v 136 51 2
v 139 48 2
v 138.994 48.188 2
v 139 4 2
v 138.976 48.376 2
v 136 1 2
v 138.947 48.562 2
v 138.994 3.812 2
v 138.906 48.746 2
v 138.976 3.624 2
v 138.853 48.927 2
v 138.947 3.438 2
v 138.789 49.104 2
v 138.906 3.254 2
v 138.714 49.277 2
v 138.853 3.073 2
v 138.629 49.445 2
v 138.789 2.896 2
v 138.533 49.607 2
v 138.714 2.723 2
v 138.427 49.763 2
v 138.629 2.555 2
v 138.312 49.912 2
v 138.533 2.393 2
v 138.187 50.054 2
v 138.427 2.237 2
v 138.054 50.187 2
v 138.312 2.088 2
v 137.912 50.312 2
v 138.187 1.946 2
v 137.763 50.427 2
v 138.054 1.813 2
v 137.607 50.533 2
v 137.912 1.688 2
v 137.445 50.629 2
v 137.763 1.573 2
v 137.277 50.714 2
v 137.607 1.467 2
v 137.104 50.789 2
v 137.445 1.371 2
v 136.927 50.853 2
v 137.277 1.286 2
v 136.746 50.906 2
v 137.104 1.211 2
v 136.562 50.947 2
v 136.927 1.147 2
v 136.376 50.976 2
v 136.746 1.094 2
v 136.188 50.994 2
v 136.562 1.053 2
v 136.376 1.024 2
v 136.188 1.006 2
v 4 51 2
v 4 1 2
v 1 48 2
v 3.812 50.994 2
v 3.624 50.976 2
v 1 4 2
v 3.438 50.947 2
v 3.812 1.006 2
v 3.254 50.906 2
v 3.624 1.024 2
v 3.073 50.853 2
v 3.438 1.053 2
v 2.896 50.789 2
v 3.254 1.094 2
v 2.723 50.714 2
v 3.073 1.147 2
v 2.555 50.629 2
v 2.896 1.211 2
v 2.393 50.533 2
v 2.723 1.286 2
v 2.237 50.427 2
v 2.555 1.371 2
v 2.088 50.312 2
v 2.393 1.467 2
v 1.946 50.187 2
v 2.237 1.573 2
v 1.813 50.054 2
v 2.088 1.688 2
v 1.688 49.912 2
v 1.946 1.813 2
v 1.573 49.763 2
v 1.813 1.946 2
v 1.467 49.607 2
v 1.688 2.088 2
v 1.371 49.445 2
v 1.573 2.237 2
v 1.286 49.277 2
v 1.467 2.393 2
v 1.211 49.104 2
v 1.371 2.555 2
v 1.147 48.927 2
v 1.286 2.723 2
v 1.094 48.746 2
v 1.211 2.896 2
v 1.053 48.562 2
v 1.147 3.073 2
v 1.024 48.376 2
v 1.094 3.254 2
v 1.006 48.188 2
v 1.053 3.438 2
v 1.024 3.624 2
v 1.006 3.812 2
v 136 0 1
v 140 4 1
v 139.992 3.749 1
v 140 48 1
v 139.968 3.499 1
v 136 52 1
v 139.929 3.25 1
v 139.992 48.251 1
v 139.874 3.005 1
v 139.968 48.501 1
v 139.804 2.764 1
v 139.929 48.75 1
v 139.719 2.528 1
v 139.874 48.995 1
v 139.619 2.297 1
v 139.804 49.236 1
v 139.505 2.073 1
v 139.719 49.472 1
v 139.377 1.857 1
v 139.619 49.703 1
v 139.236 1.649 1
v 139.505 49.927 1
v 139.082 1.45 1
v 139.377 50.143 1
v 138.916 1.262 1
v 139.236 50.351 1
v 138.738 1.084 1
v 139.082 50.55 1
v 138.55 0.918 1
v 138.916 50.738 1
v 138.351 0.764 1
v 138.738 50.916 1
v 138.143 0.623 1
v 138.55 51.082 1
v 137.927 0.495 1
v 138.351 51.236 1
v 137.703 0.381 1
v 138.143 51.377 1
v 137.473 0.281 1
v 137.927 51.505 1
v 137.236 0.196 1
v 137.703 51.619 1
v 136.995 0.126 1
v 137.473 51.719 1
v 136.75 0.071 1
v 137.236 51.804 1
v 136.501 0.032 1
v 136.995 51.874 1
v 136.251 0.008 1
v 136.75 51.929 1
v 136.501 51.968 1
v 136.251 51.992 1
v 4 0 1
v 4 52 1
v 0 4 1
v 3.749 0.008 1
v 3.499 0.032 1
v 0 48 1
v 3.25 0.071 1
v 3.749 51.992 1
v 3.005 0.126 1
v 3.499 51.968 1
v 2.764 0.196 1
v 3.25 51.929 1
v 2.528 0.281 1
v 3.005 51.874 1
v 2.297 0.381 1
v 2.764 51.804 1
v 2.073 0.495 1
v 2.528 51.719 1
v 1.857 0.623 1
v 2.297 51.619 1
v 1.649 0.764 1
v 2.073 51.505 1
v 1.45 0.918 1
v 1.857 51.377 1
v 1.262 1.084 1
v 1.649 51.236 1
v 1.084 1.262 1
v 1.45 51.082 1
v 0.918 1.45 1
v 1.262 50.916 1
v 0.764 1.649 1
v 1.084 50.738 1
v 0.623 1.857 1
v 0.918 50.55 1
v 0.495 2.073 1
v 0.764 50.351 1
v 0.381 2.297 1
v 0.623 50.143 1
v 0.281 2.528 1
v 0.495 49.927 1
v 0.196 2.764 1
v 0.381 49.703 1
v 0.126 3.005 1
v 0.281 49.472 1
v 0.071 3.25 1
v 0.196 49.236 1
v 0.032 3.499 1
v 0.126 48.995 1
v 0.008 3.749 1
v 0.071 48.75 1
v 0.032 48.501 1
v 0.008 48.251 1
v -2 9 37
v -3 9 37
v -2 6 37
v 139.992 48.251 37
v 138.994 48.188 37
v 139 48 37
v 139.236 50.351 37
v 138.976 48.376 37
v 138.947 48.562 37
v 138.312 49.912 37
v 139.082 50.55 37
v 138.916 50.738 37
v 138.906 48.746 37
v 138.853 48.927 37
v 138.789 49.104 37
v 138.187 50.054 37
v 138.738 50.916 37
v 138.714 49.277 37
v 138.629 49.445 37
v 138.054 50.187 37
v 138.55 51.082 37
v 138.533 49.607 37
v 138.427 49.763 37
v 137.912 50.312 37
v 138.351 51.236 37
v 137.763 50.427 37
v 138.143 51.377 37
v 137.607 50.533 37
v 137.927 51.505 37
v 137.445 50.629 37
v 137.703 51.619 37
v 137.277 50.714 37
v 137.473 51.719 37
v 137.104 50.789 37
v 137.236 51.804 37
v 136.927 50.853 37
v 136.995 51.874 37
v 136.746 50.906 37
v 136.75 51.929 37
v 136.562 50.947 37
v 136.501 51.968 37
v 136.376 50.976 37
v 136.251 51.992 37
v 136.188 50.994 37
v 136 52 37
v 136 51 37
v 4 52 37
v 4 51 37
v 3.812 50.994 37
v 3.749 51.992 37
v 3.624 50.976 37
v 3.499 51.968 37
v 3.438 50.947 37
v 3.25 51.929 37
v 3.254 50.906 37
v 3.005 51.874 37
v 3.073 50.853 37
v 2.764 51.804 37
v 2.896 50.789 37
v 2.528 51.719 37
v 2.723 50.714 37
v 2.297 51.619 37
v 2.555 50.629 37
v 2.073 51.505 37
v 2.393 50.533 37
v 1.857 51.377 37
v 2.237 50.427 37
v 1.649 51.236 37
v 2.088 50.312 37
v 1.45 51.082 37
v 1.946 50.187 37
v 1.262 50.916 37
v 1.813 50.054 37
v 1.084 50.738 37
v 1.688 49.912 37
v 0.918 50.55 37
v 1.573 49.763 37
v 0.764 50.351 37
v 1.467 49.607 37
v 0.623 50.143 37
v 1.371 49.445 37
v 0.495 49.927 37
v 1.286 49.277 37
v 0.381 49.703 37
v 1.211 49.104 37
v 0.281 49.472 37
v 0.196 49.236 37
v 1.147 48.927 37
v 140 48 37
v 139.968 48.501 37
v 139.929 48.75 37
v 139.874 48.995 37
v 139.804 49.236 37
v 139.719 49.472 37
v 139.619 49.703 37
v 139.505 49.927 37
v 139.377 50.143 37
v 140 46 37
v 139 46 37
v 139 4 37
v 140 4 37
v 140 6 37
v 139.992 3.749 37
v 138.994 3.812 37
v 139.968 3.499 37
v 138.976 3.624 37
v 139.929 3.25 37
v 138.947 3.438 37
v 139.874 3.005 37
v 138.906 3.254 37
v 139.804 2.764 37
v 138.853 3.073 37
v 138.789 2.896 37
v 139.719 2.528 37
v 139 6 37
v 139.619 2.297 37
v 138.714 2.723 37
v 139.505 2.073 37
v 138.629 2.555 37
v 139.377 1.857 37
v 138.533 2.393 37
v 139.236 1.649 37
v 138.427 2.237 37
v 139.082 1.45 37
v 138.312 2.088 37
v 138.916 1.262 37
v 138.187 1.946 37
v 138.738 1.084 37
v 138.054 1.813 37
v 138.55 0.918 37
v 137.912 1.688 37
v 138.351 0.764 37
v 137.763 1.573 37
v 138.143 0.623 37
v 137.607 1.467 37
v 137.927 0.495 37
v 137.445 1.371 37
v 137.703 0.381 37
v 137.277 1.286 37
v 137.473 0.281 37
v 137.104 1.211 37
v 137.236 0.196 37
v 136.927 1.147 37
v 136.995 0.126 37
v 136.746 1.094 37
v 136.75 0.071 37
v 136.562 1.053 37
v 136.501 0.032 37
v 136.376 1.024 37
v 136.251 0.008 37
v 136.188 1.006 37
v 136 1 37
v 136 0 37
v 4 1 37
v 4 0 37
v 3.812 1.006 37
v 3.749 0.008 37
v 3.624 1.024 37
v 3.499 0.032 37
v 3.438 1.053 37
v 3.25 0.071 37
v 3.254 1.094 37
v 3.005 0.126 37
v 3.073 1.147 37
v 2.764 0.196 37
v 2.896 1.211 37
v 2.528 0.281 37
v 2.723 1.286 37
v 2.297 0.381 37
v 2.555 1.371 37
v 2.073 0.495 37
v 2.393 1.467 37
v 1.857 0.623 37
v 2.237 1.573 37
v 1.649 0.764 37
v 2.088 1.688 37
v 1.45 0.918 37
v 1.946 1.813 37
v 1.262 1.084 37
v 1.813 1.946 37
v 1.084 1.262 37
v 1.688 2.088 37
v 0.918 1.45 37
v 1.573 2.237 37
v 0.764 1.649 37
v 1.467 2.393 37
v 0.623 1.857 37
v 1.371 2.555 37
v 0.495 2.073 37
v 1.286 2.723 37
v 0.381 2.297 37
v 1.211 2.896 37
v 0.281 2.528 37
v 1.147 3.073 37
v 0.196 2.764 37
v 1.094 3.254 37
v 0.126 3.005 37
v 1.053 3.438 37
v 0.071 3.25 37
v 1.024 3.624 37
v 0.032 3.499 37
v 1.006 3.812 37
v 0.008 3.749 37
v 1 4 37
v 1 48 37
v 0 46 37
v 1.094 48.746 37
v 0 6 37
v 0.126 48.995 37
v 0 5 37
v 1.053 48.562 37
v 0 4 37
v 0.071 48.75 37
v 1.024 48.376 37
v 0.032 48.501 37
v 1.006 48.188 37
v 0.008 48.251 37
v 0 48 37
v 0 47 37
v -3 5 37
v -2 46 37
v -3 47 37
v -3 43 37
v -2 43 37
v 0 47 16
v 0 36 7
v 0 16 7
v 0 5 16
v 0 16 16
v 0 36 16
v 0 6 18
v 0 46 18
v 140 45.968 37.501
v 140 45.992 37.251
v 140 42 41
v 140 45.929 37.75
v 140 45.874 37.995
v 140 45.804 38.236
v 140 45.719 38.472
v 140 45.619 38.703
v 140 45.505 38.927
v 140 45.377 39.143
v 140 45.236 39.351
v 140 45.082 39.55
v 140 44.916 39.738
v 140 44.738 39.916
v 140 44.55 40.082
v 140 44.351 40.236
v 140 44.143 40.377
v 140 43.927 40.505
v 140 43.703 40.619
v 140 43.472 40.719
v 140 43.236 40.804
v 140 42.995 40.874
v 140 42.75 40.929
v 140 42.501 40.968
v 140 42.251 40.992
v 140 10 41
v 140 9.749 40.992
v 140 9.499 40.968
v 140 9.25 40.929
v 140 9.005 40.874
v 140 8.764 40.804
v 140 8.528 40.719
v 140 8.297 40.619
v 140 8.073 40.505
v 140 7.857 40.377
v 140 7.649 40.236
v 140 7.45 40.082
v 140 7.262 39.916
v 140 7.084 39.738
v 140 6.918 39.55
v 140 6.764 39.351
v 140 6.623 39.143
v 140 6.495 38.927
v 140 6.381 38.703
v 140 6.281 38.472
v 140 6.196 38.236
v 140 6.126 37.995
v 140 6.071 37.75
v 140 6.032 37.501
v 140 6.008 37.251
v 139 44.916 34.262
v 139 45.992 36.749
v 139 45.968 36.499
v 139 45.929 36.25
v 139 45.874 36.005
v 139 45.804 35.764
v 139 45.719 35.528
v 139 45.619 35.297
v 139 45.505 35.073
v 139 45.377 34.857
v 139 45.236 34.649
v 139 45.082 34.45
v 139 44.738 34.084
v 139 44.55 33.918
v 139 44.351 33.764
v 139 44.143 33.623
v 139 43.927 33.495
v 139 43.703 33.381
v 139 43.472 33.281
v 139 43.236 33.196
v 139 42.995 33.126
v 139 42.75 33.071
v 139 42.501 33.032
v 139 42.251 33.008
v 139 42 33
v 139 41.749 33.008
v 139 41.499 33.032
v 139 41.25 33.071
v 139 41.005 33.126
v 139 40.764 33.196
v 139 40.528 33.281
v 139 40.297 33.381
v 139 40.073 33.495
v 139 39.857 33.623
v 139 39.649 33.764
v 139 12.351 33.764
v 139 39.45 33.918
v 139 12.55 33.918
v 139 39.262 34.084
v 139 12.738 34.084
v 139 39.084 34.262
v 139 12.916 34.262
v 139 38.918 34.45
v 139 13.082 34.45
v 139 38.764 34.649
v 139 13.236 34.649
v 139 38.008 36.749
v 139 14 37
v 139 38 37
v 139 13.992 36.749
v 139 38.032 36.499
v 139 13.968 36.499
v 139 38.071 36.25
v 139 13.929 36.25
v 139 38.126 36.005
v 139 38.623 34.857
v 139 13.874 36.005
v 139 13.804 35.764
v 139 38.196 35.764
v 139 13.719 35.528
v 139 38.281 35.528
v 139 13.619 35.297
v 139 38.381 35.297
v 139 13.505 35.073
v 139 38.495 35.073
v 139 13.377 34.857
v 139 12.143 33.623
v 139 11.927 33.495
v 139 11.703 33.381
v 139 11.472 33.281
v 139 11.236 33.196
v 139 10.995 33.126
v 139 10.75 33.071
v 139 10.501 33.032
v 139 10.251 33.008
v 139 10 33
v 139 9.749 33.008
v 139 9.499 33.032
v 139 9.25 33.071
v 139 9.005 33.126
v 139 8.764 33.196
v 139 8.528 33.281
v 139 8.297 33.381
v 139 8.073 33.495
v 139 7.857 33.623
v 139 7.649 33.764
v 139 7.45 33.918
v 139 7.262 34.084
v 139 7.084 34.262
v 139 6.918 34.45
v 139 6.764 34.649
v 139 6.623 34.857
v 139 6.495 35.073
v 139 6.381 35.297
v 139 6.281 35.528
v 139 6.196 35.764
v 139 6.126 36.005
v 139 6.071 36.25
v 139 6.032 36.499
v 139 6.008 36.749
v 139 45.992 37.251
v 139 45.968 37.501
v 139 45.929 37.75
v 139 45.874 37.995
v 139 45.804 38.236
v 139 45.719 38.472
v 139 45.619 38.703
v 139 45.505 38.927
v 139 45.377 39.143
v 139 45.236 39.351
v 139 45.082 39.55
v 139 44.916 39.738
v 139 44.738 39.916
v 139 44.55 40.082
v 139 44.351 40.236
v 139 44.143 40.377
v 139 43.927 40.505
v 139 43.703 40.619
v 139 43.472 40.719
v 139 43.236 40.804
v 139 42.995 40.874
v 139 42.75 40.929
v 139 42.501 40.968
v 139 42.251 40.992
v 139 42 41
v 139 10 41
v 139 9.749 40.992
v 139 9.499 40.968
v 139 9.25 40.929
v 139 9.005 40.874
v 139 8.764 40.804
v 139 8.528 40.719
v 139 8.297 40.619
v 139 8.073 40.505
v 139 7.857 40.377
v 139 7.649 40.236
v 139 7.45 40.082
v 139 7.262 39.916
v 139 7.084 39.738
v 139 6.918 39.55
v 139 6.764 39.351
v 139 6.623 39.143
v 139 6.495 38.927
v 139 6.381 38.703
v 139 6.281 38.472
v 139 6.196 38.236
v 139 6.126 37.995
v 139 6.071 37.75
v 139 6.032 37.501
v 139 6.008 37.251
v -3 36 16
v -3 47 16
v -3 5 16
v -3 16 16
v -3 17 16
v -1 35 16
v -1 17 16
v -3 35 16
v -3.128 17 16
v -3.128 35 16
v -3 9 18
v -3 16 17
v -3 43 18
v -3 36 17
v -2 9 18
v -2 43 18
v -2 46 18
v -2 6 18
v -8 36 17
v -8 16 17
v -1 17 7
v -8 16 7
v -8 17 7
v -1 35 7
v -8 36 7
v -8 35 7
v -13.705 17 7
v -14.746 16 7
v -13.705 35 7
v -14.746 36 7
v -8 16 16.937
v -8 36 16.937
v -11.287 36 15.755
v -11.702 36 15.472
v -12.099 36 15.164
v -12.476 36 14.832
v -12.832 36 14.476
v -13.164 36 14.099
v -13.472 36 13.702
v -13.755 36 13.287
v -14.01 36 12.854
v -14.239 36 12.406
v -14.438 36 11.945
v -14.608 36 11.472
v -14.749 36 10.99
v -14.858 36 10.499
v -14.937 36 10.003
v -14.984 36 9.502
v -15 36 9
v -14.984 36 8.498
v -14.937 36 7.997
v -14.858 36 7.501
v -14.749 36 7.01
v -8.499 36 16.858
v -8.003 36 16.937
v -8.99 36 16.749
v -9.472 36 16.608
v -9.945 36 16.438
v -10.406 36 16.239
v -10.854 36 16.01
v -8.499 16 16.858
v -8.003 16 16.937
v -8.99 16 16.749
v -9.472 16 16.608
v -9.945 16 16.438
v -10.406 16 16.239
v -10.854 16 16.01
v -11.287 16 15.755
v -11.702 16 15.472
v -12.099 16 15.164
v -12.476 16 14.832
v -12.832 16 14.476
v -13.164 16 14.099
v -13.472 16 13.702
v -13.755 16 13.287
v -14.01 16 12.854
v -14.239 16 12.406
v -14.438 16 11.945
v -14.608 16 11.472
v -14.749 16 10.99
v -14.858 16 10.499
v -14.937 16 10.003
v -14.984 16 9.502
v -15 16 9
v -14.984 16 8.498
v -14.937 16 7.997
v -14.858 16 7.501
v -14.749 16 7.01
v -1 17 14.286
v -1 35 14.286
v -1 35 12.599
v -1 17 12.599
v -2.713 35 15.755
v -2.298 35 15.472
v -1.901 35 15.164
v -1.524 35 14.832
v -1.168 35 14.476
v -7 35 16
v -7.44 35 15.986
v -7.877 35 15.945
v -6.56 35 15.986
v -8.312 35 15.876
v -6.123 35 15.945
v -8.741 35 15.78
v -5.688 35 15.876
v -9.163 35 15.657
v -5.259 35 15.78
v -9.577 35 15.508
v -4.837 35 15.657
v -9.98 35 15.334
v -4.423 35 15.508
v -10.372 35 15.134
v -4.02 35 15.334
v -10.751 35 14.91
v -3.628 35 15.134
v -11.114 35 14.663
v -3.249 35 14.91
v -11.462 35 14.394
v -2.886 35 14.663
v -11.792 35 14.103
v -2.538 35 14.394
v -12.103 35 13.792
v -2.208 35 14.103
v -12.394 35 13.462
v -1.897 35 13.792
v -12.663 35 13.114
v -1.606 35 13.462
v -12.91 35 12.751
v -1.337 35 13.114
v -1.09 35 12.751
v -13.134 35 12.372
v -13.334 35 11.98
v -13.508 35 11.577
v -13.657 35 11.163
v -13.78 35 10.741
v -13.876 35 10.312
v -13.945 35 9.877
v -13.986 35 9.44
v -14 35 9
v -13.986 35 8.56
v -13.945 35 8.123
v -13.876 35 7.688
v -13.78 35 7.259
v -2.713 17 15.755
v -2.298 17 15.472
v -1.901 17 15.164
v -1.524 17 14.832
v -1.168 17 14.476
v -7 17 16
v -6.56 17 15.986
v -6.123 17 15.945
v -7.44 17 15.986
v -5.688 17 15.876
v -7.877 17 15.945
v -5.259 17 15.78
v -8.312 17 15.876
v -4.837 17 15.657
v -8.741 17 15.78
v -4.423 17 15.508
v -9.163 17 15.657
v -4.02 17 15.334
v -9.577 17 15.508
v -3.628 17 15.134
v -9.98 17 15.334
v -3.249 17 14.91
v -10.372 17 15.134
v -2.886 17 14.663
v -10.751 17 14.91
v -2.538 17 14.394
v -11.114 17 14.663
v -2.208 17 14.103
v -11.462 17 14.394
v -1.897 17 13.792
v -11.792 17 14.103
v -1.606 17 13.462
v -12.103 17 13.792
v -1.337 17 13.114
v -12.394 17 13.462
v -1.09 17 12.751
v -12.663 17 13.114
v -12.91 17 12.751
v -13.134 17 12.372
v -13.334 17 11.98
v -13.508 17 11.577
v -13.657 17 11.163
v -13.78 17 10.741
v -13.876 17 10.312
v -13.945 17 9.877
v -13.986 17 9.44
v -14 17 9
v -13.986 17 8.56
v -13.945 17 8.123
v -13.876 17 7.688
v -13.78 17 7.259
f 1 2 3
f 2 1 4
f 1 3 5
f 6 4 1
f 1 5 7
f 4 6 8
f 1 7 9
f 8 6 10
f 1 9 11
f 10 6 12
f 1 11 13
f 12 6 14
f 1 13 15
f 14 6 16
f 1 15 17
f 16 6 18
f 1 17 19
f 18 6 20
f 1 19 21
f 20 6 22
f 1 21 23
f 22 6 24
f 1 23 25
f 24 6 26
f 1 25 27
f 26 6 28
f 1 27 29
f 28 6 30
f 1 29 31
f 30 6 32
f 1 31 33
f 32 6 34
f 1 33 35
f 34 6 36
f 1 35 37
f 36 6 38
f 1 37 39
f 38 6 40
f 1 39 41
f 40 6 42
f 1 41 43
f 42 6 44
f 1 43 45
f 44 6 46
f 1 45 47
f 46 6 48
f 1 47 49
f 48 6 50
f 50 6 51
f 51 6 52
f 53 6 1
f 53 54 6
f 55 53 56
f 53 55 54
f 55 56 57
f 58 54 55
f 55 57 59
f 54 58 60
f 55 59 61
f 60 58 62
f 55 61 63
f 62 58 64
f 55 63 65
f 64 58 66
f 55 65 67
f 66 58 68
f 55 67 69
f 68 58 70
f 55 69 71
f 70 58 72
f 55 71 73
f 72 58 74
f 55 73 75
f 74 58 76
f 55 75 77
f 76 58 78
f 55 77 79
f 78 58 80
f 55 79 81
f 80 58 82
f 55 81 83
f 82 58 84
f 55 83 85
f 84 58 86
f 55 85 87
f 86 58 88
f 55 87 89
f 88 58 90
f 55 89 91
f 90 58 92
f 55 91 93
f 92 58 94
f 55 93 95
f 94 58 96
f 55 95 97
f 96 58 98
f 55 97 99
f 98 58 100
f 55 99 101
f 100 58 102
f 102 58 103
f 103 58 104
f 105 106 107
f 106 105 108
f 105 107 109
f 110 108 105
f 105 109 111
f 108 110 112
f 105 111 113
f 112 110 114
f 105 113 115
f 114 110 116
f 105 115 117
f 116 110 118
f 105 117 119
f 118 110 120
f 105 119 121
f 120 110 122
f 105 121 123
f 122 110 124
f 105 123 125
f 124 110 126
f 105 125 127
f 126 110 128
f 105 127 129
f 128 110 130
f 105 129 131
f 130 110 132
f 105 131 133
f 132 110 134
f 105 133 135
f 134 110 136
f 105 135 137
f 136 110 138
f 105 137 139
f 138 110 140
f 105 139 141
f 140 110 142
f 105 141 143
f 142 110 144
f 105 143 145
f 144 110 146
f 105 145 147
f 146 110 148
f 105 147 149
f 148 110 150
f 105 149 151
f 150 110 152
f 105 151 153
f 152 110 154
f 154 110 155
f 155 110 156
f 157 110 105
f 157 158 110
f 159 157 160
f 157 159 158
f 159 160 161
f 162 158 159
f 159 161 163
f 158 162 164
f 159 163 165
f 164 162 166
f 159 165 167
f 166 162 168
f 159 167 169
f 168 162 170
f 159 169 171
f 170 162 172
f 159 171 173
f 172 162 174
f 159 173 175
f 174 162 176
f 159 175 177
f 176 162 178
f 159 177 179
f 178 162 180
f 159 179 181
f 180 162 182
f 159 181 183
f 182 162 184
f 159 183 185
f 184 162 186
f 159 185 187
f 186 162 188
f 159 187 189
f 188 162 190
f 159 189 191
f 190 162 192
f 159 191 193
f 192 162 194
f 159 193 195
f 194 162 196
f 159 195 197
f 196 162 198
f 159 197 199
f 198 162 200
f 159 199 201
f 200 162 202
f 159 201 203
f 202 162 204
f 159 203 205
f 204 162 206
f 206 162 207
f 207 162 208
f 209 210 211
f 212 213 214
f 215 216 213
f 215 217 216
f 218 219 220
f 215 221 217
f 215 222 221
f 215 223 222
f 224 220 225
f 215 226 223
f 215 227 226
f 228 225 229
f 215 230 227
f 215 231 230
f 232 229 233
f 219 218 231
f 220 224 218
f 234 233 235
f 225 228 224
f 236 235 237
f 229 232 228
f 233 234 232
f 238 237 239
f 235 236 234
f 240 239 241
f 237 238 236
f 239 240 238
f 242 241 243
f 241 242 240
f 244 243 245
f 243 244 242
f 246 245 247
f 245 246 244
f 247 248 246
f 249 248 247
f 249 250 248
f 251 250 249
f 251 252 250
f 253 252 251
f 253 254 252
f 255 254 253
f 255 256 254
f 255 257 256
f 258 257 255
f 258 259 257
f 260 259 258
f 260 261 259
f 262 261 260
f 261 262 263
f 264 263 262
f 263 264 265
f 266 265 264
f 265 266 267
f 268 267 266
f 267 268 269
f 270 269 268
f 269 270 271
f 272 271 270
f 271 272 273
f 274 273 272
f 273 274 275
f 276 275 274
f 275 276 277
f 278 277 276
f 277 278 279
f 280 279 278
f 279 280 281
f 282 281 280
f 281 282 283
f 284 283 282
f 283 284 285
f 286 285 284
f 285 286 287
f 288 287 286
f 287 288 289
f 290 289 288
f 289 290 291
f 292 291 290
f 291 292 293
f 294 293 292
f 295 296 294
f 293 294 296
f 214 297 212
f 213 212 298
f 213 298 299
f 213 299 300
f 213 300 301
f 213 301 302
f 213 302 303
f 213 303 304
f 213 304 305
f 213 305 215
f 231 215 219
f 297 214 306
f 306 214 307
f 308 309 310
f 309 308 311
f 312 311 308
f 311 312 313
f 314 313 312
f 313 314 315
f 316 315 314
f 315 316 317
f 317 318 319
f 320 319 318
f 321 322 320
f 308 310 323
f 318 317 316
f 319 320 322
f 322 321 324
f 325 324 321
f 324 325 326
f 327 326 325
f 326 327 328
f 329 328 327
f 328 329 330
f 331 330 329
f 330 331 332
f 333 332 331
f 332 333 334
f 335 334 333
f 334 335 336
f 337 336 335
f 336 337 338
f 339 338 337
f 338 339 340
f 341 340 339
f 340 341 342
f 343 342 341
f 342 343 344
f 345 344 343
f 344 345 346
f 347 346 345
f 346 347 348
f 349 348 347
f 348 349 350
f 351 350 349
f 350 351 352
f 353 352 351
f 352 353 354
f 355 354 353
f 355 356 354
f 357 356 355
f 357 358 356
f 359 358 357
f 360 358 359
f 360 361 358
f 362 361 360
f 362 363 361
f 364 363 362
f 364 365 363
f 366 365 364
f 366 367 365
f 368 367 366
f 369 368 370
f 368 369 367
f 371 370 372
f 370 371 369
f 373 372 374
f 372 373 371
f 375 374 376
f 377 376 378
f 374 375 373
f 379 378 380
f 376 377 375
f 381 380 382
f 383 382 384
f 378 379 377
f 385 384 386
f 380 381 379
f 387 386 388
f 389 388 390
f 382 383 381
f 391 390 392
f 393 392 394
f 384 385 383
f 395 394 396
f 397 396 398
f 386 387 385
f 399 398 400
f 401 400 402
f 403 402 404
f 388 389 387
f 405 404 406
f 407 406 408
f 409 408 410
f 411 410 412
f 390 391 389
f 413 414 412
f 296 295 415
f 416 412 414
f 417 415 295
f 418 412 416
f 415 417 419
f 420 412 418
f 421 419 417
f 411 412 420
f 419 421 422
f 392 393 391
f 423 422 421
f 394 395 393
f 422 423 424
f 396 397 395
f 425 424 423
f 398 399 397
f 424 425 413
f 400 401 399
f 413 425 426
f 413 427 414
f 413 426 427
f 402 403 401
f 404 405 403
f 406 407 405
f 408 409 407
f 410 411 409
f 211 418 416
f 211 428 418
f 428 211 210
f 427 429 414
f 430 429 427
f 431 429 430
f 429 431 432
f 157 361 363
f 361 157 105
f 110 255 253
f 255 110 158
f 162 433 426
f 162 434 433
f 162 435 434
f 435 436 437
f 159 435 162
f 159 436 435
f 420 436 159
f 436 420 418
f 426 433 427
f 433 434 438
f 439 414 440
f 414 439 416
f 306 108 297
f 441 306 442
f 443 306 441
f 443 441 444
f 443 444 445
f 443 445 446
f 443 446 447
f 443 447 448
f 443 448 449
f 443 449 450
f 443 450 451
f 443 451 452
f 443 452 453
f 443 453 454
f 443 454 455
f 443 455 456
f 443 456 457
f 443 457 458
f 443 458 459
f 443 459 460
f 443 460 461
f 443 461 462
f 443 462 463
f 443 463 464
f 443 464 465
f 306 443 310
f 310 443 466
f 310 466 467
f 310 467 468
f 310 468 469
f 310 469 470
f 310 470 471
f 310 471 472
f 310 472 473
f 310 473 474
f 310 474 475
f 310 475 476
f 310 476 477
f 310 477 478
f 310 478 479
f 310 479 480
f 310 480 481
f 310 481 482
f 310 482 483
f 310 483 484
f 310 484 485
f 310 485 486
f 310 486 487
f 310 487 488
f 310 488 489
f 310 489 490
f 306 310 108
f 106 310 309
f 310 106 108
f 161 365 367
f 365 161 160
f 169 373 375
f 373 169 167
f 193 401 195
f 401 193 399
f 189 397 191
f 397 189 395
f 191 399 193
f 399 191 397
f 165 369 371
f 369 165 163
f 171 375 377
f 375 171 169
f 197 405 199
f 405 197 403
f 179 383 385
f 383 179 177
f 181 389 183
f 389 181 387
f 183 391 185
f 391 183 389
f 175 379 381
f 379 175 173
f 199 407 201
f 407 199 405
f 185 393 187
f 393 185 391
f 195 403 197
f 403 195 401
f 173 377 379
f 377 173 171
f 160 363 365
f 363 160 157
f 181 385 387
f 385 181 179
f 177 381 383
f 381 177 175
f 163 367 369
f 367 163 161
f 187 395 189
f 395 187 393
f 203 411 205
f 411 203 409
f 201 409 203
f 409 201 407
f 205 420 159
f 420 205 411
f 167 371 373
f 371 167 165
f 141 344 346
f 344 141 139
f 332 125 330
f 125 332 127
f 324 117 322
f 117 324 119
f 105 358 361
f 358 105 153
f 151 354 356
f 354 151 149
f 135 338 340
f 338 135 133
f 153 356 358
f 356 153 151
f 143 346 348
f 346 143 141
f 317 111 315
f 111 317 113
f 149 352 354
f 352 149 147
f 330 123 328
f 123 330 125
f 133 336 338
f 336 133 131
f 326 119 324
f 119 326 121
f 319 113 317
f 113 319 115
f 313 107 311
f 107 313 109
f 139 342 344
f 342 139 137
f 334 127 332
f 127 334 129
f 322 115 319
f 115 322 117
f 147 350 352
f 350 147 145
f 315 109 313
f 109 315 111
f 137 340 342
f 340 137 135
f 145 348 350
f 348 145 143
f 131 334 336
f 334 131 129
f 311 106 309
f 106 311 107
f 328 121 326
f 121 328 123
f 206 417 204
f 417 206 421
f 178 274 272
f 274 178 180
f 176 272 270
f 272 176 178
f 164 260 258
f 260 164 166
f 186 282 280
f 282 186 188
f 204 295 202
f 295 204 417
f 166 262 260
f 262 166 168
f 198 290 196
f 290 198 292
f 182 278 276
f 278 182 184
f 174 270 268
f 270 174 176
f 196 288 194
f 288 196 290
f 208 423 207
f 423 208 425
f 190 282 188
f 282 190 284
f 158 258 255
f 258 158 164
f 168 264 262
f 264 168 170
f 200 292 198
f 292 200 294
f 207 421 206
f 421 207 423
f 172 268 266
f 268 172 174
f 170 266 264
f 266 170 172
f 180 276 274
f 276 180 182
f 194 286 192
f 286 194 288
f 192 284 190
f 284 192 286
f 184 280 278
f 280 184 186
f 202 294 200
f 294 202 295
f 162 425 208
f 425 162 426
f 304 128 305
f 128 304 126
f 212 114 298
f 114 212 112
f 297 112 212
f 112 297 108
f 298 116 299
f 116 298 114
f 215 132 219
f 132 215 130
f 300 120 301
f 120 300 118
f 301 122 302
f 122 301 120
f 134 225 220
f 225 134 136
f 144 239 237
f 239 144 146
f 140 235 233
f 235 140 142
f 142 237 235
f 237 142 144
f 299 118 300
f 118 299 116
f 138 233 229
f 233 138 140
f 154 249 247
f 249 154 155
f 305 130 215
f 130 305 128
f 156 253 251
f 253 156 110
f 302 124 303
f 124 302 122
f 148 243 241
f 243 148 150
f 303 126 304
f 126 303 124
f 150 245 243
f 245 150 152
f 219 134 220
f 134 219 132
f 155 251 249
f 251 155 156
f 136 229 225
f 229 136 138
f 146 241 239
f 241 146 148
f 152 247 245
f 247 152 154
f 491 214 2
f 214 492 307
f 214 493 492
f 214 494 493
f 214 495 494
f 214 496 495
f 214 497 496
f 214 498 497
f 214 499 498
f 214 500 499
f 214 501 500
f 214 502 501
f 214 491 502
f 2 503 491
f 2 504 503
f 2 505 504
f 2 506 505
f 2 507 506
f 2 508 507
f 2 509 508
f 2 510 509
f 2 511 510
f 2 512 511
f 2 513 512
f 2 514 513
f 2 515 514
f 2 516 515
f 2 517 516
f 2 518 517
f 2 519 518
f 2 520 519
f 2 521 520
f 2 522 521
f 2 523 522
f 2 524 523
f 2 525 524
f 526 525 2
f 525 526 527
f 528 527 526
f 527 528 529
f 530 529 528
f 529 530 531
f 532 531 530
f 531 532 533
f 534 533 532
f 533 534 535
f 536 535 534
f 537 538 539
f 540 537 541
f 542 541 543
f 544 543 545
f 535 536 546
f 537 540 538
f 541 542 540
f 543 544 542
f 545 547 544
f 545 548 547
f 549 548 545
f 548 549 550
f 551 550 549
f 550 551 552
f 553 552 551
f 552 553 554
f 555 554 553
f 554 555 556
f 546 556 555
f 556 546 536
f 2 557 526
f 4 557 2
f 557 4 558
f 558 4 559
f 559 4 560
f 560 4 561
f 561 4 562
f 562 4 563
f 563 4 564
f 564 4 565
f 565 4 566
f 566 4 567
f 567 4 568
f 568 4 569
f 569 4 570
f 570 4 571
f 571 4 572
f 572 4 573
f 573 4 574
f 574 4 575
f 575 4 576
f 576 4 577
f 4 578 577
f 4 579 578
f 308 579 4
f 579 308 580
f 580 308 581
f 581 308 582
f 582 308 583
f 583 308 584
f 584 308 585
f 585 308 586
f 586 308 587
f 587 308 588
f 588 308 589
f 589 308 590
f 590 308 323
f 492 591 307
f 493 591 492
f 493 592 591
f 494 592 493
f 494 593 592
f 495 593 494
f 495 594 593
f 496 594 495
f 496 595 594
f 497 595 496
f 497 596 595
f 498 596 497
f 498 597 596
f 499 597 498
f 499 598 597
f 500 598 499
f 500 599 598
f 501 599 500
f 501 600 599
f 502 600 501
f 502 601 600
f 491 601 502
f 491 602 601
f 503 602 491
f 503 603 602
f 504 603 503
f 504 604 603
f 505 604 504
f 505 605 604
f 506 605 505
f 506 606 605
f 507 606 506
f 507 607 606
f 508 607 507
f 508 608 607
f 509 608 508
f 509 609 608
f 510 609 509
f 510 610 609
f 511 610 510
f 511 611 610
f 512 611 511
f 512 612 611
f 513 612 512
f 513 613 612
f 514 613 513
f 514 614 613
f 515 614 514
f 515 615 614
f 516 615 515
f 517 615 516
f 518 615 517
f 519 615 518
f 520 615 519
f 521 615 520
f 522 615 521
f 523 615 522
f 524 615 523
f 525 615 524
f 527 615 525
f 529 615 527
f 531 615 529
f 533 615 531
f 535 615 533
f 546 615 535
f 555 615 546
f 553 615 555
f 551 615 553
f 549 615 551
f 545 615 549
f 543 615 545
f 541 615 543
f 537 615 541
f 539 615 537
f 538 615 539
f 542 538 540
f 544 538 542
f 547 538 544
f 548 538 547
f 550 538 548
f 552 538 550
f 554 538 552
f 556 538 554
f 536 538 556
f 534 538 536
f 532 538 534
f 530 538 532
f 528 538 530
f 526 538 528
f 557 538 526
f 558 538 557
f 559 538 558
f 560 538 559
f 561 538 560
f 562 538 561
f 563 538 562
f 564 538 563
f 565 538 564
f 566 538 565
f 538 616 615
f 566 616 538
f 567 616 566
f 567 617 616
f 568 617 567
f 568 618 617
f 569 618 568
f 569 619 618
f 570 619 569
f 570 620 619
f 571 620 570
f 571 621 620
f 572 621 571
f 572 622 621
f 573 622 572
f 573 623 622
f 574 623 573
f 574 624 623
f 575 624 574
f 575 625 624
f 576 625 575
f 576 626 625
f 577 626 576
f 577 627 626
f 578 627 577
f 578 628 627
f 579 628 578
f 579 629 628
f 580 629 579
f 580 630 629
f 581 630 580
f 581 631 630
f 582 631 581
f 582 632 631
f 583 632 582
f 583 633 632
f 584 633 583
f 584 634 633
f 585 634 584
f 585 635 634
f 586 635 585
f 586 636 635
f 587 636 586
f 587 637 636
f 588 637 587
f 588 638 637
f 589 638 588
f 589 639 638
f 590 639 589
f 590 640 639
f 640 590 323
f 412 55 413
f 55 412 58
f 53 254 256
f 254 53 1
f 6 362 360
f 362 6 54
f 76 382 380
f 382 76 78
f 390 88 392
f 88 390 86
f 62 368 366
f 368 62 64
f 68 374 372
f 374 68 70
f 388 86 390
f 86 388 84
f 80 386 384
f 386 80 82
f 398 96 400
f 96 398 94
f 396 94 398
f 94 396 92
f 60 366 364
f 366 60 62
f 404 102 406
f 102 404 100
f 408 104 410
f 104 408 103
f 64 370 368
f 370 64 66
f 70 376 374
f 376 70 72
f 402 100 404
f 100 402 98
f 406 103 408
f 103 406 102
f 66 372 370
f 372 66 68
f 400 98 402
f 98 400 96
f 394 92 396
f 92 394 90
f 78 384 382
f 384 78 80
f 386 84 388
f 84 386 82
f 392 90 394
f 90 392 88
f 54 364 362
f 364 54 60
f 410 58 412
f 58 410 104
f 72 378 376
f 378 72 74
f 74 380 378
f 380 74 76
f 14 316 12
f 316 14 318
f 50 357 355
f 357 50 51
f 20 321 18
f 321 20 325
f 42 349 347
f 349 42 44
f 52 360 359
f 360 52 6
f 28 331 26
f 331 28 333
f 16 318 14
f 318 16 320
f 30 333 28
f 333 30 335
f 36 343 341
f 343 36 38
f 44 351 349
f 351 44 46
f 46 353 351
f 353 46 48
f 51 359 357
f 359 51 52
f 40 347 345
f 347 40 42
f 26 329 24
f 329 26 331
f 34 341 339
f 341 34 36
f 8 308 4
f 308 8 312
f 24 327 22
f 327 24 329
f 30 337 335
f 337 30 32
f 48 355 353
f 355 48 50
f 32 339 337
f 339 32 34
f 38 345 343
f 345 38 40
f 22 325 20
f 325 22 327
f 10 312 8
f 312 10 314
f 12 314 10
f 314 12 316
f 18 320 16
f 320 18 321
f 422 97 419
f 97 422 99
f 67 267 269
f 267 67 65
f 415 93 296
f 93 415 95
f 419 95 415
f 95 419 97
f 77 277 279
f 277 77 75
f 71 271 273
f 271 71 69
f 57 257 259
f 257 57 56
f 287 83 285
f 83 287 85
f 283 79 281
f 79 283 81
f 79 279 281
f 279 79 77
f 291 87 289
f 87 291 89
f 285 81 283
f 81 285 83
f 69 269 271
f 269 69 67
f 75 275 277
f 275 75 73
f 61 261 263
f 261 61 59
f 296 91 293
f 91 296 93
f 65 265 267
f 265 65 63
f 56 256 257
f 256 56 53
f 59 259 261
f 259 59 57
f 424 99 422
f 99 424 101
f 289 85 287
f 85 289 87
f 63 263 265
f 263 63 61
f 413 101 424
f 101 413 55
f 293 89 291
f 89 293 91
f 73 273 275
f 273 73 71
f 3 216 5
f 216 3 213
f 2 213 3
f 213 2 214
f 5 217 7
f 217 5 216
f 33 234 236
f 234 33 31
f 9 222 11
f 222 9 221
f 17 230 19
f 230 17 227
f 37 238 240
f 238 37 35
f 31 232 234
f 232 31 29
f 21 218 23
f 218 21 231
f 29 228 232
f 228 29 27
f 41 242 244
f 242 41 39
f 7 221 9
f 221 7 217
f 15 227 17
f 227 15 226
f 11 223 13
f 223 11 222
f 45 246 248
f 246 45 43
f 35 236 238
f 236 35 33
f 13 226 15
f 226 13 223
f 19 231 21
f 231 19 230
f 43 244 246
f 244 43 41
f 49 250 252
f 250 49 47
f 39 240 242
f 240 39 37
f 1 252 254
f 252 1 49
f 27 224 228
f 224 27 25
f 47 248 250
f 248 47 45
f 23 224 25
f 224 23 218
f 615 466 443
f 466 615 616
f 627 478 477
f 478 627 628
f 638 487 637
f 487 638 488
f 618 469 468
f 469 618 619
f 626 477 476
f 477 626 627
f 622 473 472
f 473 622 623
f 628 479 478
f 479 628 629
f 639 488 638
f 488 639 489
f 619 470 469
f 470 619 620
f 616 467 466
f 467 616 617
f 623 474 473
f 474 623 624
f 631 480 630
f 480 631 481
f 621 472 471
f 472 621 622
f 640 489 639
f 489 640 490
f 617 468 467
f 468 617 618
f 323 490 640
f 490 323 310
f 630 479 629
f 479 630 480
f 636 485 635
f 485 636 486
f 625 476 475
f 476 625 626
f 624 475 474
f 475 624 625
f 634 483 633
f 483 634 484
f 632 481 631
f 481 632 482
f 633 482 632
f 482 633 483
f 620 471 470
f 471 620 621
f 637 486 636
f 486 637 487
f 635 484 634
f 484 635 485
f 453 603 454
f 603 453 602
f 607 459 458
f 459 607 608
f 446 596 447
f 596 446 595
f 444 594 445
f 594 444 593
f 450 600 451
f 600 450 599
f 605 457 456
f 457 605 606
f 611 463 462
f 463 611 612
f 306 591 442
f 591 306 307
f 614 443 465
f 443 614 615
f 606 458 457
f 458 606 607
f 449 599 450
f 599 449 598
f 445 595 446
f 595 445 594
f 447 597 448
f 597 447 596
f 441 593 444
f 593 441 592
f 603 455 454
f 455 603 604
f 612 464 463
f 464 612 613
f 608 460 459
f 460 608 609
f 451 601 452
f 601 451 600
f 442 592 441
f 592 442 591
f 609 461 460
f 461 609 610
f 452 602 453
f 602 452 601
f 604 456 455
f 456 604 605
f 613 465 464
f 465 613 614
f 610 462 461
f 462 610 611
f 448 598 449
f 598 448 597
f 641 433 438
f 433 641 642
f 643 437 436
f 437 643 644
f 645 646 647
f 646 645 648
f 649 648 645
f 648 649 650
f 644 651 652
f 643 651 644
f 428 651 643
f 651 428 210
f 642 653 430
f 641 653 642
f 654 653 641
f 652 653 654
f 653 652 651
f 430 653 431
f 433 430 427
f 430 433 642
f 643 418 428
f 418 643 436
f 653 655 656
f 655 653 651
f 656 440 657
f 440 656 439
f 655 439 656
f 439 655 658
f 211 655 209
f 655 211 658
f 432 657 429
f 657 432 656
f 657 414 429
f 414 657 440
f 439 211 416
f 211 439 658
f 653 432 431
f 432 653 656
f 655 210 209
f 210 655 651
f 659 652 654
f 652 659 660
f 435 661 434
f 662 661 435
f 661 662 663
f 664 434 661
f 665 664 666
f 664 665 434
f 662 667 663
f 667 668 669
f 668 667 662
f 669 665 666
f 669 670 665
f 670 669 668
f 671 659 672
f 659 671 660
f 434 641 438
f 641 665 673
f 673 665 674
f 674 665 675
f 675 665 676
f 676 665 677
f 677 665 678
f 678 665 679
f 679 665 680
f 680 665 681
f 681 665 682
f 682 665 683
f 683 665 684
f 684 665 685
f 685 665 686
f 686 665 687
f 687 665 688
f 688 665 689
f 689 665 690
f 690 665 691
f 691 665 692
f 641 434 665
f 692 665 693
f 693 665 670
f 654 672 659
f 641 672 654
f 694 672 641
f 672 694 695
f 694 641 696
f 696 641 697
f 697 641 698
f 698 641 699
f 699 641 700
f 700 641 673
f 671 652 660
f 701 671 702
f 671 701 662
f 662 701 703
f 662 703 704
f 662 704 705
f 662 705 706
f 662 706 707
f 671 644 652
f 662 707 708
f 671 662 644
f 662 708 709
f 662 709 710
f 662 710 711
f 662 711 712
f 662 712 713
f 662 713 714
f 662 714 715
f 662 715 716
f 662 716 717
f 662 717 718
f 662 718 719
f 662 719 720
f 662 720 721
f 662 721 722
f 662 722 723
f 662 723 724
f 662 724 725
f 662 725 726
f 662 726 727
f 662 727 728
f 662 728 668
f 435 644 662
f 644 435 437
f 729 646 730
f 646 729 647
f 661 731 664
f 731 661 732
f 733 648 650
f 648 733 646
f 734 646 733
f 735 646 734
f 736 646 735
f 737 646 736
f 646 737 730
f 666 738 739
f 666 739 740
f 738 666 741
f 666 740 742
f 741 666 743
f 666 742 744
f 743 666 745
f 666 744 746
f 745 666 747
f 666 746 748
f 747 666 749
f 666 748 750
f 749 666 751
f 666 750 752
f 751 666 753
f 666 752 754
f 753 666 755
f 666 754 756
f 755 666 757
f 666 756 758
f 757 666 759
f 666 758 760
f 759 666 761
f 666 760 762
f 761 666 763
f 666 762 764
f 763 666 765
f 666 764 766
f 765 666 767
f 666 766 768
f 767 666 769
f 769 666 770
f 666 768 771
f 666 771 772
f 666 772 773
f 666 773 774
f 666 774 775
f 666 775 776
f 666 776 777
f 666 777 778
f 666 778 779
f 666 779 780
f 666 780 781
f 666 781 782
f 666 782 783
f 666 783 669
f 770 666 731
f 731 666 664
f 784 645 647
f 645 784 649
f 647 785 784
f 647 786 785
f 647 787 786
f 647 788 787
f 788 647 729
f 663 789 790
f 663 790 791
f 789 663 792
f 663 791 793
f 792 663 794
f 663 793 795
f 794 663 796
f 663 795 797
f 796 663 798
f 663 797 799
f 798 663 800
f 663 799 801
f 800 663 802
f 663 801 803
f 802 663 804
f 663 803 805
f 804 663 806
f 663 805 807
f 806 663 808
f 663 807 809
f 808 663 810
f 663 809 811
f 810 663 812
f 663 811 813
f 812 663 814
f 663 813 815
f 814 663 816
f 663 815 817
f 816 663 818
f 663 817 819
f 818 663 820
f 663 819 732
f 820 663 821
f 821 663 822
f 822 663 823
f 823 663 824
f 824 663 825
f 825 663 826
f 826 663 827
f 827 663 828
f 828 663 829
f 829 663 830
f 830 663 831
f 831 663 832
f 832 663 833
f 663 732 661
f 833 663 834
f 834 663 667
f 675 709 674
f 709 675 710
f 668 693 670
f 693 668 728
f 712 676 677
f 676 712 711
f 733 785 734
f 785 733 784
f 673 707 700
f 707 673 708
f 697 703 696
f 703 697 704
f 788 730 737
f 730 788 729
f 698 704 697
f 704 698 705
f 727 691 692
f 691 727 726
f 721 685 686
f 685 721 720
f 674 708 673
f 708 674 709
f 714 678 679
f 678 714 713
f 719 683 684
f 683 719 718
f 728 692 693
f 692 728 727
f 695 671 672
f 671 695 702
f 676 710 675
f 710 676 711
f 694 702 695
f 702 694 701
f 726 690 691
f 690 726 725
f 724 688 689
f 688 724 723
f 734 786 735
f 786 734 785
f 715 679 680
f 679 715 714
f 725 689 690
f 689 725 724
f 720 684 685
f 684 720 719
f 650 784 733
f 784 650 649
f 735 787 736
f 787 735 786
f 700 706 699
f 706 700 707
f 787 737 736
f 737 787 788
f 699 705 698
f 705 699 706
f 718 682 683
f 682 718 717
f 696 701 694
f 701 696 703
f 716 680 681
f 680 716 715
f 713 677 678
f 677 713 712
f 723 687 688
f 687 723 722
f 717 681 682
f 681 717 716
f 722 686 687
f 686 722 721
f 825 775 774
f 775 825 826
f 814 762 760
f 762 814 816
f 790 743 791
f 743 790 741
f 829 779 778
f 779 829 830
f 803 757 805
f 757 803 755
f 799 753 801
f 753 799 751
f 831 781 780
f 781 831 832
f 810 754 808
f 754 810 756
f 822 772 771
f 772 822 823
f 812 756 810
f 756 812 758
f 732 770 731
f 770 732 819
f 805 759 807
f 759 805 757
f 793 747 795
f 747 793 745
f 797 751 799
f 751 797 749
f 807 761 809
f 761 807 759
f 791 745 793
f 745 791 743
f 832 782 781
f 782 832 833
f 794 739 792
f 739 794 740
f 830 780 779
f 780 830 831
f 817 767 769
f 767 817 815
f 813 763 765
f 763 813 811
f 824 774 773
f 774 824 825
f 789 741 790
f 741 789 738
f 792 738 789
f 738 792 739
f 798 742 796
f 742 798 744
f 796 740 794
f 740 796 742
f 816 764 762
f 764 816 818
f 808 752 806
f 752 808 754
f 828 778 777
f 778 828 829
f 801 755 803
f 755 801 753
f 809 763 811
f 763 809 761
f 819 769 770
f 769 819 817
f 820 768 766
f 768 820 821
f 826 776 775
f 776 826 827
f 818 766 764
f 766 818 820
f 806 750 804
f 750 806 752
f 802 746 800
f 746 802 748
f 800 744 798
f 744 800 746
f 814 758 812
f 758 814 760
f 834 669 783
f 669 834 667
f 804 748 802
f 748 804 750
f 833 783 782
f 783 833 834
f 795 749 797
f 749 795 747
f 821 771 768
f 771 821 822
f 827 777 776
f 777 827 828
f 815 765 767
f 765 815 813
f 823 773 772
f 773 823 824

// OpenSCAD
echo(version=version());
// increase the visual detail
$fn = 100;

// Main Box
module mainboxsolid() {
    //Cubes
    //Main
    translate([4, 4, 1])
    cube([132,44,1]);
    //Bot
    translate([4, 0, 1])
    cube([132,4,36]);
    //Top
    translate([4, 48, 1])
    cube([132,4,36]);
    //Left
    translate([0, 4, 1])
    cube([4,44,36]);
    //Right
    translate([136, 4, 1])
    cube([4,44,36]);
    
    //Cylinders
    //BotL
    translate([4, 4, 1])
    cylinder(r=4, h=36);
    //BotR
    translate([136, 4, 1])
    cylinder(r=4, h=36);
    //TopL
    translate([4, 48, 1])
    cylinder(r=4, h=36);
    //TopR
    translate([136, 48, 1])
    cylinder(r=4, h=36);
}

module mainbox() {
    difference() {
        mainboxsolid();
        
        //Cubes
        //LR
        translate([1, 4, 2])
        cube([138,44,36]);
        //TB
        translate([4, 1, 2])
        cube([132,50,36]);
        
        //Cylinders
        //BotL
        translate([4, 4, 2])
        cylinder(r=3, h=36);
        //BotR
        translate([136, 4, 2])
        cylinder(r=3, h=36);
        //TopL
        translate([4, 48, 2])
        cylinder(r=3, h=36);
        //TopR
        translate([136, 48, 2])
        cylinder(r=3, h=36);
    }
}

// Rails
module rails() {
    //Front Rail
    translate([5, 10, 0])
    cube([130,1,1]);
    
    //Back Rail
    translate([5, 41, 0])
    cube([130,1,1]);
}

// Stopper
module stopper() {
    translate([139, 10, 37])
    cube([1,32,4]);
    
    translate([139, 10, 37])
    rotate([0, 90, 0])
    cylinder(r=4, h=1);
    
    translate([139, 42, 37])
    rotate([0, 90, 0])
    cylinder(r=4, h=1);
}

// Label Slot
module labelslot() {
    difference() {
        translate([-3, 5, 16])
        cube([3,42,21]);

        color("white")
        translate([-2, 6, 18])
        cube([2,40,21]);
        
        color("white")
        translate([-4, 9, 18])
        cube([3,34,20]);
    }
}

// Handle
module handle() {
    difference() {
        translate([-8, 16, 7])
        cube([8,20,10]);

        color("white")
        translate([-9, 17, 6])
        cube([8,18,10]);
    }

    difference() {
        translate([-7, 36, 9])  
        rotate([90, 0, 0])
        cylinder(r=8, h=20);

        color("white")
        translate([-7, 35, 9])  
        rotate([90, 0, 0])
        cylinder(r=7, h=18);

        color("white")
        translate([-15, 15, 0])
        cube([15,22,7]);
    }
}

// Modules
mainbox();
//rails();
stopper();
labelslot();
handle();
